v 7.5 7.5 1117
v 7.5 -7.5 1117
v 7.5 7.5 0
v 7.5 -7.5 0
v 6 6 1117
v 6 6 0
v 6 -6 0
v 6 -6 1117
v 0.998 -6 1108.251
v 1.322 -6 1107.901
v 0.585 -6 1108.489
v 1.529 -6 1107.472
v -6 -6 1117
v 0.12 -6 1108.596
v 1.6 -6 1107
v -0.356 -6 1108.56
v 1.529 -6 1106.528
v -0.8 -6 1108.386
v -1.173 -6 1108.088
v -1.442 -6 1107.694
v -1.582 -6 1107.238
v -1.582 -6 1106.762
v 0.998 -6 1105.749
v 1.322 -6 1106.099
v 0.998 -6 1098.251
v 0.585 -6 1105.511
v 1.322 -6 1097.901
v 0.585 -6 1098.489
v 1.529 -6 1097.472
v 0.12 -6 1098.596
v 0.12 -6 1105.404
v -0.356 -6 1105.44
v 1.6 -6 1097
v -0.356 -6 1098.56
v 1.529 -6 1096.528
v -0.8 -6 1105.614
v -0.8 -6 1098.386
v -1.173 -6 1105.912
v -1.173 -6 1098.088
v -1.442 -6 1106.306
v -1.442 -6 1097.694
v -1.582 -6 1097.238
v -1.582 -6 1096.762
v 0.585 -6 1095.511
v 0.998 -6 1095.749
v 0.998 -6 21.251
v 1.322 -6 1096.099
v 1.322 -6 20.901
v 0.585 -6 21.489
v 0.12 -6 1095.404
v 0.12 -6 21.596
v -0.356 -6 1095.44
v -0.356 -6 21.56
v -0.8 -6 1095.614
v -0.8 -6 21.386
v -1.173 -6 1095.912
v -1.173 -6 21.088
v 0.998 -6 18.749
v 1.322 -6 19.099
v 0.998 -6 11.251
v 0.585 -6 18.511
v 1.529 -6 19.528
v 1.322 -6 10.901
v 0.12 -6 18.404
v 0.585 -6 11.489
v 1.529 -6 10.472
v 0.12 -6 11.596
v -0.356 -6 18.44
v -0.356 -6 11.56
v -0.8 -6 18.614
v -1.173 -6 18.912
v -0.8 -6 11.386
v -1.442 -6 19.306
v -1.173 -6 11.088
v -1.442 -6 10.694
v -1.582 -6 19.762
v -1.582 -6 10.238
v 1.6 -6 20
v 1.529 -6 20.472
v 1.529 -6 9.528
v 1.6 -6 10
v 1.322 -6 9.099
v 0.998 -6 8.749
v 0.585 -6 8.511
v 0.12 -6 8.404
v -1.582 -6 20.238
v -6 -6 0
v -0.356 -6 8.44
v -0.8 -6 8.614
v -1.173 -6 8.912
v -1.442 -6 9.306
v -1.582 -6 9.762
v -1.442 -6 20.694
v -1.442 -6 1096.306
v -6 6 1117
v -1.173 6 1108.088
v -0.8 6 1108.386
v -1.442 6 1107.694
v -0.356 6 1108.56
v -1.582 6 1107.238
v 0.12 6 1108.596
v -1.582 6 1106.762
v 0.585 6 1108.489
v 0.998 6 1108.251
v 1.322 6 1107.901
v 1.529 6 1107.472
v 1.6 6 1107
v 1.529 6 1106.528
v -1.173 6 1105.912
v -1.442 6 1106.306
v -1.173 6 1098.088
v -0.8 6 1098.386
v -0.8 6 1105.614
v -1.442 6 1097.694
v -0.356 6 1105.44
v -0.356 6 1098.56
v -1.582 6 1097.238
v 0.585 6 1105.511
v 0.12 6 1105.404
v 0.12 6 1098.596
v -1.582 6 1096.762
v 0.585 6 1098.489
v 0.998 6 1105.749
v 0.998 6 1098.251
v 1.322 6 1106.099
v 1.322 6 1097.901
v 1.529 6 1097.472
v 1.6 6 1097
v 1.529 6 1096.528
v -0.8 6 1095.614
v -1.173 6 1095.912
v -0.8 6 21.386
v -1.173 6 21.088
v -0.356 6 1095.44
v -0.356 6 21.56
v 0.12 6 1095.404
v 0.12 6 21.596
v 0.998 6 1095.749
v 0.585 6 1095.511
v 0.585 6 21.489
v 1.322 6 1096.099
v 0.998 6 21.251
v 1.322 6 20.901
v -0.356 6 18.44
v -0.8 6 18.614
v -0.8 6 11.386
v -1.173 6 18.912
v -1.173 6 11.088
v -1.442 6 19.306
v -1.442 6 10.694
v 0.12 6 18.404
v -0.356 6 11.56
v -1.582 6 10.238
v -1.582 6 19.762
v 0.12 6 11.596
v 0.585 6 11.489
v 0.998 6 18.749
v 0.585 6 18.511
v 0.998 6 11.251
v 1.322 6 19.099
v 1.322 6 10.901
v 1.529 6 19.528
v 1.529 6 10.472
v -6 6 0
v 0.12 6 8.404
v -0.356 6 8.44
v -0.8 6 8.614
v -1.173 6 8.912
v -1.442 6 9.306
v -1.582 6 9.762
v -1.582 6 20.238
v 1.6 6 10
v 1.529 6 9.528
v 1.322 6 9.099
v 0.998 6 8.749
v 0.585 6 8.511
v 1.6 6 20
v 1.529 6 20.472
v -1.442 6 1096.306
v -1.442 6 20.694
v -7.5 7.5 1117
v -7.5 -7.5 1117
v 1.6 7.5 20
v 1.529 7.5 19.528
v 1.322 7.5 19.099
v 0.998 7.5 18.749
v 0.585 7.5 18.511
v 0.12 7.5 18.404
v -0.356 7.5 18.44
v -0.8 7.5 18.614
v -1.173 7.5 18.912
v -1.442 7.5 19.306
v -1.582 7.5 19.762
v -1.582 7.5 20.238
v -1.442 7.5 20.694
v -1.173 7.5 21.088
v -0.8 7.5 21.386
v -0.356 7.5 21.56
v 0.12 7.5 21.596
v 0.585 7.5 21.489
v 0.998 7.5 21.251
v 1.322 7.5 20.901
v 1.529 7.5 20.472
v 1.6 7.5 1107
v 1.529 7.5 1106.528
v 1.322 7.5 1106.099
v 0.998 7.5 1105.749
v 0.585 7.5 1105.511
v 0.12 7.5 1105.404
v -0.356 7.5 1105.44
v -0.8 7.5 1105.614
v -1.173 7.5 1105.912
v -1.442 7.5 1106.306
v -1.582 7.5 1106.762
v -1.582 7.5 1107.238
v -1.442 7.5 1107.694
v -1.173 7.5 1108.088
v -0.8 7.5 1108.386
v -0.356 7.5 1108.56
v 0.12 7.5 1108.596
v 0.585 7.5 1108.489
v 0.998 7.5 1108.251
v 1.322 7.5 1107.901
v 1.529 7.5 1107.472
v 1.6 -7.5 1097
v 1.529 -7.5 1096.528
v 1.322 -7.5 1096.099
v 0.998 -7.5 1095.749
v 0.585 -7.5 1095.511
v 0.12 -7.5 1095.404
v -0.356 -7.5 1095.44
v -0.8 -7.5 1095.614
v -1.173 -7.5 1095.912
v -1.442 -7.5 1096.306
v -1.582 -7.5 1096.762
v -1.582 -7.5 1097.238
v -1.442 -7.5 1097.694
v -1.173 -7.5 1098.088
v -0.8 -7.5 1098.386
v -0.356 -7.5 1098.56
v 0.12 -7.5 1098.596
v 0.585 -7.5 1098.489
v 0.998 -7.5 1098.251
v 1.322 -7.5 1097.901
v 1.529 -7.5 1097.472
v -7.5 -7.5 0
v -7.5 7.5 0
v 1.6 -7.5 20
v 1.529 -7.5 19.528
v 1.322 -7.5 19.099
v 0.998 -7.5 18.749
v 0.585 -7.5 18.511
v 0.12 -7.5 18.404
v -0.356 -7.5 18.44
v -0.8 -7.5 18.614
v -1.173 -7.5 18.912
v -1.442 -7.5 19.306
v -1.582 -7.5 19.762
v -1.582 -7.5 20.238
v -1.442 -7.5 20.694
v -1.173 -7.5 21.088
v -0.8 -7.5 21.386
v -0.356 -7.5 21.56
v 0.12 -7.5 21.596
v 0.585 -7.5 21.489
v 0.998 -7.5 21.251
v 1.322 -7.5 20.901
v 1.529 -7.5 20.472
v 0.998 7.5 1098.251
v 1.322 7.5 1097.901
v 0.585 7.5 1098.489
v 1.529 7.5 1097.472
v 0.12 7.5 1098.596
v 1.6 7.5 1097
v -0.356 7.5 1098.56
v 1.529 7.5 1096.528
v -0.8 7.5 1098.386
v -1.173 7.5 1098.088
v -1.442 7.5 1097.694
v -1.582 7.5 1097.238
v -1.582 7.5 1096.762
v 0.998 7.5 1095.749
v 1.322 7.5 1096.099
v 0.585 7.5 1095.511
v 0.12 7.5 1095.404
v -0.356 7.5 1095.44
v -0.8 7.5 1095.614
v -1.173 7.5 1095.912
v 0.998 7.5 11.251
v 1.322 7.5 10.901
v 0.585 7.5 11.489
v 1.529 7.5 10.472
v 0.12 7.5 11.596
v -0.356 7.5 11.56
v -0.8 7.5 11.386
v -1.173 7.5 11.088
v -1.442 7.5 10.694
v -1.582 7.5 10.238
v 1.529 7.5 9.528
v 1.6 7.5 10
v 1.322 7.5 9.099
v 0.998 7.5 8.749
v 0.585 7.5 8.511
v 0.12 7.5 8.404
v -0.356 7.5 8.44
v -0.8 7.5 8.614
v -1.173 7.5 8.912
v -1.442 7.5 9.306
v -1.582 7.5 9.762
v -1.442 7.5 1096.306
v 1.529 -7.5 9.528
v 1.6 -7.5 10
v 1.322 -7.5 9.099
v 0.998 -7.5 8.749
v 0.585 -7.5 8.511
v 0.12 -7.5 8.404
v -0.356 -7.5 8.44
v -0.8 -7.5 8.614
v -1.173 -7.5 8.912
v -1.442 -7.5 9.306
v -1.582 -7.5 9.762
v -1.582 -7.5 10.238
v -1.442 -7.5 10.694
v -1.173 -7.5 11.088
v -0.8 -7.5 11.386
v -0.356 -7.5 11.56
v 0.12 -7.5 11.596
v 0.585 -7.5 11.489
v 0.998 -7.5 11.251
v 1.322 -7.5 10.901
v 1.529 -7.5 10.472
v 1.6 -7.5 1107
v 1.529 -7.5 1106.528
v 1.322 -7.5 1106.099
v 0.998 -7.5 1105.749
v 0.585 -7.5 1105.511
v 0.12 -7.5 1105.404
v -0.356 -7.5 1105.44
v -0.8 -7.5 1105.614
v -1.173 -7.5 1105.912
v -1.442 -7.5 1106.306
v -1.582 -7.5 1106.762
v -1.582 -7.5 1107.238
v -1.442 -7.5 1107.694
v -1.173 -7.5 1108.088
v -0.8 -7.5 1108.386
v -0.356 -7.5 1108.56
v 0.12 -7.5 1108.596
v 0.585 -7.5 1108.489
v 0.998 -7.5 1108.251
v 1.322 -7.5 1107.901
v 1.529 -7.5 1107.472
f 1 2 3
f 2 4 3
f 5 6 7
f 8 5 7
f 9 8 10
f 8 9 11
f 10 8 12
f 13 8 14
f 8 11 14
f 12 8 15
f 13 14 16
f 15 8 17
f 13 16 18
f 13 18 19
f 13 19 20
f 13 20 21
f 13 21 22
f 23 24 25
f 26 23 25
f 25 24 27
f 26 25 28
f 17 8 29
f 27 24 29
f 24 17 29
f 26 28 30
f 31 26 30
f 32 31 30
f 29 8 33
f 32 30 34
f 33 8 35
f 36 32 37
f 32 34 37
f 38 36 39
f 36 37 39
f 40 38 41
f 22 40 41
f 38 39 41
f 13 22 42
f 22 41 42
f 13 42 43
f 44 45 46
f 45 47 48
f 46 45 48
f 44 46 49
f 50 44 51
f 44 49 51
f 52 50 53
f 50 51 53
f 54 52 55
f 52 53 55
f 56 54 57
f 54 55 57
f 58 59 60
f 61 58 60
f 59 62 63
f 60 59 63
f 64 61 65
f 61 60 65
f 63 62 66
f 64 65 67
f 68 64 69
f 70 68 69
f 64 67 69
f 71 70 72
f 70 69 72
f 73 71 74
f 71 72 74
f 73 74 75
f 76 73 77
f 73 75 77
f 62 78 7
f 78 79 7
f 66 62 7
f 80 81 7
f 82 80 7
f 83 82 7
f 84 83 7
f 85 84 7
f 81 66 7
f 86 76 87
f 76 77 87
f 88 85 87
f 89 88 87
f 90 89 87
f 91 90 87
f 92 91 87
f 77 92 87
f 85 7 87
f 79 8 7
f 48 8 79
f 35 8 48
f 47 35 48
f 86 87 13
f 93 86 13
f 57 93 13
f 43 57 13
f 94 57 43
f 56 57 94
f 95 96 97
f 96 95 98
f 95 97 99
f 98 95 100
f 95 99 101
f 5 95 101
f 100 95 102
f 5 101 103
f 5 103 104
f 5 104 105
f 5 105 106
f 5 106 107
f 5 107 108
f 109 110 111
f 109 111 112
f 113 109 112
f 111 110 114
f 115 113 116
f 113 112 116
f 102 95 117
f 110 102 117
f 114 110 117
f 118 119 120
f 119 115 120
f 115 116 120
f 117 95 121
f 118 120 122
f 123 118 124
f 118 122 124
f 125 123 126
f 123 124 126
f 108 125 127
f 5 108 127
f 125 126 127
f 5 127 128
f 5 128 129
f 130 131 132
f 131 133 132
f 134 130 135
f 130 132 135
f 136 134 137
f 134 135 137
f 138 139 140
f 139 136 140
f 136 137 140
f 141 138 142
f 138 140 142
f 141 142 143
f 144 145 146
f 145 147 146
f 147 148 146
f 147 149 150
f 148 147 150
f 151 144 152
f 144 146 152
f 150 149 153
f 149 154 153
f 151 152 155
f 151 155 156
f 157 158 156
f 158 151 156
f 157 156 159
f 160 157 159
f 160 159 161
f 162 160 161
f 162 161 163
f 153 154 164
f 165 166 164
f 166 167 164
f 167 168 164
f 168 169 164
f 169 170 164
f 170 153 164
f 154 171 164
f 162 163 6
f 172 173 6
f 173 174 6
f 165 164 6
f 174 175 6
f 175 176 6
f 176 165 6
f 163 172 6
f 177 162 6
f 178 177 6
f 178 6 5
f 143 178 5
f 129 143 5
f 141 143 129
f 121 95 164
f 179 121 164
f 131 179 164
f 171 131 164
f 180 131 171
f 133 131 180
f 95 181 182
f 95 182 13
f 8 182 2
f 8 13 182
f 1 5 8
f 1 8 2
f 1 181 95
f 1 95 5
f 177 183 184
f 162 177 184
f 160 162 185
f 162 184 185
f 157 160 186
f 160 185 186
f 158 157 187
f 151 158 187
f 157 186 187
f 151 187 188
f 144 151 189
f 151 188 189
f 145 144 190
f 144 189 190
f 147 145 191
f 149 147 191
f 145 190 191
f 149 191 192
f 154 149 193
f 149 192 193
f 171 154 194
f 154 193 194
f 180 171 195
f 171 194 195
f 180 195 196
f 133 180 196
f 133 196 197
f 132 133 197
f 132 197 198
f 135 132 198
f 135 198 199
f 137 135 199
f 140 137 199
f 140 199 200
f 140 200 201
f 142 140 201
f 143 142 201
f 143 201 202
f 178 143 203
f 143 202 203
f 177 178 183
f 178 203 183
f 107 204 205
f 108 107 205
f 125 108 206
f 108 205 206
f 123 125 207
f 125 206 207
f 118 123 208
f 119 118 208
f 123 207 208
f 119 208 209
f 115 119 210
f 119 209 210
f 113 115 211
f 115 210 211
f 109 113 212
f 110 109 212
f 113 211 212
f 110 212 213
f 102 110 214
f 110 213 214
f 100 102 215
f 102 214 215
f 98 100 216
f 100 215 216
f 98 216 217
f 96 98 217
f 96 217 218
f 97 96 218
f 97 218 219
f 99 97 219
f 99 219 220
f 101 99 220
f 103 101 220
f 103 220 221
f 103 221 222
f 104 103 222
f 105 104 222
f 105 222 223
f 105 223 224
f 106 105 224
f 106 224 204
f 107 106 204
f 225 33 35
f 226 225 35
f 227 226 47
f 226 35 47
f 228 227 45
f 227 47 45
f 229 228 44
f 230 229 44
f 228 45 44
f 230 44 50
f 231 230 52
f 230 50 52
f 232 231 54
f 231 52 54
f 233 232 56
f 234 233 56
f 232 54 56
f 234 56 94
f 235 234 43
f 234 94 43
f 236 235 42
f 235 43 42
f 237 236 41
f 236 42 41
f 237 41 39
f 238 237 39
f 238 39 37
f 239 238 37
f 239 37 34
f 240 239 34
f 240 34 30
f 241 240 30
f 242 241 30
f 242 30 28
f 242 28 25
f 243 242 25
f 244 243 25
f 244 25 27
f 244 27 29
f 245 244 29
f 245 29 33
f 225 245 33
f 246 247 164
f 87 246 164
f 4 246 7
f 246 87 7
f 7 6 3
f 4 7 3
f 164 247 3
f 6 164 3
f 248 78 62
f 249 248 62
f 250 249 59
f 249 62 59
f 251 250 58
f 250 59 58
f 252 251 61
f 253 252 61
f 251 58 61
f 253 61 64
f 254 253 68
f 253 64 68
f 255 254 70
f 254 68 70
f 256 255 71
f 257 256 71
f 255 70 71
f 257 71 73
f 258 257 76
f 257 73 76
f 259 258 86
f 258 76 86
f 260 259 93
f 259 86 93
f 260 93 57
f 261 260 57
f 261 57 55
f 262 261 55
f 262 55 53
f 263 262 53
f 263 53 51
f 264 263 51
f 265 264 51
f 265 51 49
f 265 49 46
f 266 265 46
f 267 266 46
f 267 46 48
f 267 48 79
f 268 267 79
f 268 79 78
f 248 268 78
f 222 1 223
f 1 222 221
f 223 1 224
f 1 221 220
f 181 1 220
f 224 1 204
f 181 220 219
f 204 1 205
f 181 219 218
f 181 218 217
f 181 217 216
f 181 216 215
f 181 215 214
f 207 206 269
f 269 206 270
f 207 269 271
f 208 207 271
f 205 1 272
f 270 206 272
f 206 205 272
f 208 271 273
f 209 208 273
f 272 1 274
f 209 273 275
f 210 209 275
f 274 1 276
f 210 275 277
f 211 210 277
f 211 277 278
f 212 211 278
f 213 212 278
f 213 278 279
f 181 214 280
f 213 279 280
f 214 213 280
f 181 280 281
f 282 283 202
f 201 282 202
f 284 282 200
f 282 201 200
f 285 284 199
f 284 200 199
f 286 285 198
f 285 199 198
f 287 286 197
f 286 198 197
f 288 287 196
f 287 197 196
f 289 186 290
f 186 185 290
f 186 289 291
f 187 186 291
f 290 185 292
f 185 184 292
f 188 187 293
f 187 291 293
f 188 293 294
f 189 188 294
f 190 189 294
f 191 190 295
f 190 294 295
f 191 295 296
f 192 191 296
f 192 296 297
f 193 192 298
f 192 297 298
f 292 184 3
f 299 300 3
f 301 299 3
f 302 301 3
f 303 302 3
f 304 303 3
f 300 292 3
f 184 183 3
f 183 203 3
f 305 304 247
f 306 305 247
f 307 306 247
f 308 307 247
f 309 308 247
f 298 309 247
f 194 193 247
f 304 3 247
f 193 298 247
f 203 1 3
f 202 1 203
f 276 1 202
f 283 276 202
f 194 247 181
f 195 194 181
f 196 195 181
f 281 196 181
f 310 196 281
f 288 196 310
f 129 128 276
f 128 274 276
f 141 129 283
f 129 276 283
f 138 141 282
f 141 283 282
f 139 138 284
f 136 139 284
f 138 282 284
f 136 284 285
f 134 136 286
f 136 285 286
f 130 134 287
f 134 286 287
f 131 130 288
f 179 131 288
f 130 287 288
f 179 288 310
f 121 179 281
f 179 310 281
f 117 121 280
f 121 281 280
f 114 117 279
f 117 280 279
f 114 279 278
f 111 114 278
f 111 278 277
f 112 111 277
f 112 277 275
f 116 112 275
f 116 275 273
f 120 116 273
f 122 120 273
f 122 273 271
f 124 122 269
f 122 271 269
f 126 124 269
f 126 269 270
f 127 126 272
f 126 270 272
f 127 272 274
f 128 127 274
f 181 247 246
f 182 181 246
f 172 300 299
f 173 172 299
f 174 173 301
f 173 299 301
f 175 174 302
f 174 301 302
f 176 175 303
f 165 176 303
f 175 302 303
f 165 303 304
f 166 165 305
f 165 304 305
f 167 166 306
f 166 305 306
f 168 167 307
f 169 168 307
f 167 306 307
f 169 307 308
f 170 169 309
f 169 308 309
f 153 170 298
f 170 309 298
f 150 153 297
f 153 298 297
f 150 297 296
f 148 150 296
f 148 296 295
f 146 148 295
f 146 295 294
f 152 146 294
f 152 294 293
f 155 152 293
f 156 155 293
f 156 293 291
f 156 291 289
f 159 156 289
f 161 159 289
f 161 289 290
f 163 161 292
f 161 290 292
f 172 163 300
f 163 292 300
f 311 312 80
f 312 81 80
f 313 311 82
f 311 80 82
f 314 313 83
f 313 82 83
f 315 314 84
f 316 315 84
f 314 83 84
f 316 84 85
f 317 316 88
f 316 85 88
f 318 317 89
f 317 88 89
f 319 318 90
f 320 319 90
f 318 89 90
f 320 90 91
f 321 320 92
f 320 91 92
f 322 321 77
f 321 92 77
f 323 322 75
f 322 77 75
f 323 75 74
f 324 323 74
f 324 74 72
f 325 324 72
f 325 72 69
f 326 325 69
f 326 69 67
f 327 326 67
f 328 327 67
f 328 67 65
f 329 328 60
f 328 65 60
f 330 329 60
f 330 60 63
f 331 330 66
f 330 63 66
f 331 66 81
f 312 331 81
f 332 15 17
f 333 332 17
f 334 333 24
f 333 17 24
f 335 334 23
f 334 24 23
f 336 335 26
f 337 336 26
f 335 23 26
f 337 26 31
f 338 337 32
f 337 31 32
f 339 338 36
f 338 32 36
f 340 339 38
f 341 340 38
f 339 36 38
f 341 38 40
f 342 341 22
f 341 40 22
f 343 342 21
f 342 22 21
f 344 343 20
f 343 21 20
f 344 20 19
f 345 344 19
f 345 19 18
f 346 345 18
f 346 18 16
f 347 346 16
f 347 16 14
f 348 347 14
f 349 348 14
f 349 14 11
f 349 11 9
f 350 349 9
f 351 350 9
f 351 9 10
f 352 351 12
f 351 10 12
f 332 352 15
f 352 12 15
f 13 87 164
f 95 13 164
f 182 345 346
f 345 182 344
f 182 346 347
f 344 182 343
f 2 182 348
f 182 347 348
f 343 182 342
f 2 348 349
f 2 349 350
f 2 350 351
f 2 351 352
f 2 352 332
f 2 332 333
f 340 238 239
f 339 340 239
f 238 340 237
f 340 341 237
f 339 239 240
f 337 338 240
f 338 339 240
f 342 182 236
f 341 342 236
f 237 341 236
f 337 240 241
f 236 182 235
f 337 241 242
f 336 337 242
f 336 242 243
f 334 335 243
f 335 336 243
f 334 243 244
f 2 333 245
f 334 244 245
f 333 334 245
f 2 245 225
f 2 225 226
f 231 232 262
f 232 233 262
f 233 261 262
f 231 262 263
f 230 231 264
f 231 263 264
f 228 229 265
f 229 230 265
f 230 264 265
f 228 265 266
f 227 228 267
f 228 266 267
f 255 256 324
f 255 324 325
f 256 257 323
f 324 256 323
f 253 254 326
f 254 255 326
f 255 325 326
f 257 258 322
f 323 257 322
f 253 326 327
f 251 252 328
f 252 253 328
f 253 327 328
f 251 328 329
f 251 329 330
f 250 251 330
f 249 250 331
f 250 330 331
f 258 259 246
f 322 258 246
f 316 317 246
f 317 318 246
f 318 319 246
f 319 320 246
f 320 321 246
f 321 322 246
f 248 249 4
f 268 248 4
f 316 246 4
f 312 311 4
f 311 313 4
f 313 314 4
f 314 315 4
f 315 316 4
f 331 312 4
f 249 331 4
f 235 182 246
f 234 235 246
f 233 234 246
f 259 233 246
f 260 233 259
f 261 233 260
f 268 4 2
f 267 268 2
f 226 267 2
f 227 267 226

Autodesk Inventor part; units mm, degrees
ref_plane "YZ Plane" through (0, 0, 0) normal (1, 0, 0) x (0, 1, 0)
ref_plane "XZ Plane" through (0, 0, 0) normal (0, 1, 0) x (-1, 0, 0)
ref_plane "XY Plane" through (0, 0, 0) normal (0, 0, 1) x (1, 0, 0)
sketch "スケッチ1" plane through (0, 0, 0) normal (0, 0, 1) x (1, 0, 0)
  line L0 (7.5, 7.5) -> (-7.5, 7.5)
  line L1 (-7.5, 7.5) -> (-7.5, -7.5)
  line L2 (-7.5, -7.5) -> (7.5, -7.5)
  line L3 (7.5, -7.5) -> (7.5, 7.5)
  line L4 (7.5, 7.5) -> (-7.5, -7.5) construction
  line L5 (-7.5, 7.5) -> (7.5, -7.5) construction
  line L6 (-6, 6) -> (6, 6)
  line L7 (6, 6) -> (6, -6)
  line L8 (6, -6) -> (-6, -6)
  line L9 (-6, -6) -> (-6, 6)
  point P0 (0, 0)
  dimension "d0" = 15
  dimension "d1" = 15
  dimension "d2" = 1.5
extrude "押し出し1" add sketch "スケッチ1" along normal blind 1117
sketch "スケッチ2" plane through (-7.5, 7.5, 1117) normal (0, 1, 0) x (1, 0, 0)
  circle A0 centre (7.5, 1107) radius 1.6
  circle A1 centre (7.5, 1097) radius 1.6
  line L0 (15, 1117) -> (0, 1117) projected
  circle A2 centre (7.5, 10) radius 1.6
  circle A3 centre (7.5, 20) radius 1.6
  line L1 (15, 0) -> (0, 0) projected
  point P0 (7.5, 1117)
  point P1 (7.5, 1117)
  point P2 (7.5, 0)
  dimension "d5" = 3.2
  dimension "d6" = 3.2
  dimension "d7" = 10
  dimension "d8" = 10
  dimension "d9" = 3.2
  dimension "d10" = 3.2
  dimension "d11" = 10
  dimension "d12" = 10
extrude "押し出し2" cut sketch "スケッチ2" against normal through all
properties part number "上昇機構_角柱2" material "アルミニウム 6061"
